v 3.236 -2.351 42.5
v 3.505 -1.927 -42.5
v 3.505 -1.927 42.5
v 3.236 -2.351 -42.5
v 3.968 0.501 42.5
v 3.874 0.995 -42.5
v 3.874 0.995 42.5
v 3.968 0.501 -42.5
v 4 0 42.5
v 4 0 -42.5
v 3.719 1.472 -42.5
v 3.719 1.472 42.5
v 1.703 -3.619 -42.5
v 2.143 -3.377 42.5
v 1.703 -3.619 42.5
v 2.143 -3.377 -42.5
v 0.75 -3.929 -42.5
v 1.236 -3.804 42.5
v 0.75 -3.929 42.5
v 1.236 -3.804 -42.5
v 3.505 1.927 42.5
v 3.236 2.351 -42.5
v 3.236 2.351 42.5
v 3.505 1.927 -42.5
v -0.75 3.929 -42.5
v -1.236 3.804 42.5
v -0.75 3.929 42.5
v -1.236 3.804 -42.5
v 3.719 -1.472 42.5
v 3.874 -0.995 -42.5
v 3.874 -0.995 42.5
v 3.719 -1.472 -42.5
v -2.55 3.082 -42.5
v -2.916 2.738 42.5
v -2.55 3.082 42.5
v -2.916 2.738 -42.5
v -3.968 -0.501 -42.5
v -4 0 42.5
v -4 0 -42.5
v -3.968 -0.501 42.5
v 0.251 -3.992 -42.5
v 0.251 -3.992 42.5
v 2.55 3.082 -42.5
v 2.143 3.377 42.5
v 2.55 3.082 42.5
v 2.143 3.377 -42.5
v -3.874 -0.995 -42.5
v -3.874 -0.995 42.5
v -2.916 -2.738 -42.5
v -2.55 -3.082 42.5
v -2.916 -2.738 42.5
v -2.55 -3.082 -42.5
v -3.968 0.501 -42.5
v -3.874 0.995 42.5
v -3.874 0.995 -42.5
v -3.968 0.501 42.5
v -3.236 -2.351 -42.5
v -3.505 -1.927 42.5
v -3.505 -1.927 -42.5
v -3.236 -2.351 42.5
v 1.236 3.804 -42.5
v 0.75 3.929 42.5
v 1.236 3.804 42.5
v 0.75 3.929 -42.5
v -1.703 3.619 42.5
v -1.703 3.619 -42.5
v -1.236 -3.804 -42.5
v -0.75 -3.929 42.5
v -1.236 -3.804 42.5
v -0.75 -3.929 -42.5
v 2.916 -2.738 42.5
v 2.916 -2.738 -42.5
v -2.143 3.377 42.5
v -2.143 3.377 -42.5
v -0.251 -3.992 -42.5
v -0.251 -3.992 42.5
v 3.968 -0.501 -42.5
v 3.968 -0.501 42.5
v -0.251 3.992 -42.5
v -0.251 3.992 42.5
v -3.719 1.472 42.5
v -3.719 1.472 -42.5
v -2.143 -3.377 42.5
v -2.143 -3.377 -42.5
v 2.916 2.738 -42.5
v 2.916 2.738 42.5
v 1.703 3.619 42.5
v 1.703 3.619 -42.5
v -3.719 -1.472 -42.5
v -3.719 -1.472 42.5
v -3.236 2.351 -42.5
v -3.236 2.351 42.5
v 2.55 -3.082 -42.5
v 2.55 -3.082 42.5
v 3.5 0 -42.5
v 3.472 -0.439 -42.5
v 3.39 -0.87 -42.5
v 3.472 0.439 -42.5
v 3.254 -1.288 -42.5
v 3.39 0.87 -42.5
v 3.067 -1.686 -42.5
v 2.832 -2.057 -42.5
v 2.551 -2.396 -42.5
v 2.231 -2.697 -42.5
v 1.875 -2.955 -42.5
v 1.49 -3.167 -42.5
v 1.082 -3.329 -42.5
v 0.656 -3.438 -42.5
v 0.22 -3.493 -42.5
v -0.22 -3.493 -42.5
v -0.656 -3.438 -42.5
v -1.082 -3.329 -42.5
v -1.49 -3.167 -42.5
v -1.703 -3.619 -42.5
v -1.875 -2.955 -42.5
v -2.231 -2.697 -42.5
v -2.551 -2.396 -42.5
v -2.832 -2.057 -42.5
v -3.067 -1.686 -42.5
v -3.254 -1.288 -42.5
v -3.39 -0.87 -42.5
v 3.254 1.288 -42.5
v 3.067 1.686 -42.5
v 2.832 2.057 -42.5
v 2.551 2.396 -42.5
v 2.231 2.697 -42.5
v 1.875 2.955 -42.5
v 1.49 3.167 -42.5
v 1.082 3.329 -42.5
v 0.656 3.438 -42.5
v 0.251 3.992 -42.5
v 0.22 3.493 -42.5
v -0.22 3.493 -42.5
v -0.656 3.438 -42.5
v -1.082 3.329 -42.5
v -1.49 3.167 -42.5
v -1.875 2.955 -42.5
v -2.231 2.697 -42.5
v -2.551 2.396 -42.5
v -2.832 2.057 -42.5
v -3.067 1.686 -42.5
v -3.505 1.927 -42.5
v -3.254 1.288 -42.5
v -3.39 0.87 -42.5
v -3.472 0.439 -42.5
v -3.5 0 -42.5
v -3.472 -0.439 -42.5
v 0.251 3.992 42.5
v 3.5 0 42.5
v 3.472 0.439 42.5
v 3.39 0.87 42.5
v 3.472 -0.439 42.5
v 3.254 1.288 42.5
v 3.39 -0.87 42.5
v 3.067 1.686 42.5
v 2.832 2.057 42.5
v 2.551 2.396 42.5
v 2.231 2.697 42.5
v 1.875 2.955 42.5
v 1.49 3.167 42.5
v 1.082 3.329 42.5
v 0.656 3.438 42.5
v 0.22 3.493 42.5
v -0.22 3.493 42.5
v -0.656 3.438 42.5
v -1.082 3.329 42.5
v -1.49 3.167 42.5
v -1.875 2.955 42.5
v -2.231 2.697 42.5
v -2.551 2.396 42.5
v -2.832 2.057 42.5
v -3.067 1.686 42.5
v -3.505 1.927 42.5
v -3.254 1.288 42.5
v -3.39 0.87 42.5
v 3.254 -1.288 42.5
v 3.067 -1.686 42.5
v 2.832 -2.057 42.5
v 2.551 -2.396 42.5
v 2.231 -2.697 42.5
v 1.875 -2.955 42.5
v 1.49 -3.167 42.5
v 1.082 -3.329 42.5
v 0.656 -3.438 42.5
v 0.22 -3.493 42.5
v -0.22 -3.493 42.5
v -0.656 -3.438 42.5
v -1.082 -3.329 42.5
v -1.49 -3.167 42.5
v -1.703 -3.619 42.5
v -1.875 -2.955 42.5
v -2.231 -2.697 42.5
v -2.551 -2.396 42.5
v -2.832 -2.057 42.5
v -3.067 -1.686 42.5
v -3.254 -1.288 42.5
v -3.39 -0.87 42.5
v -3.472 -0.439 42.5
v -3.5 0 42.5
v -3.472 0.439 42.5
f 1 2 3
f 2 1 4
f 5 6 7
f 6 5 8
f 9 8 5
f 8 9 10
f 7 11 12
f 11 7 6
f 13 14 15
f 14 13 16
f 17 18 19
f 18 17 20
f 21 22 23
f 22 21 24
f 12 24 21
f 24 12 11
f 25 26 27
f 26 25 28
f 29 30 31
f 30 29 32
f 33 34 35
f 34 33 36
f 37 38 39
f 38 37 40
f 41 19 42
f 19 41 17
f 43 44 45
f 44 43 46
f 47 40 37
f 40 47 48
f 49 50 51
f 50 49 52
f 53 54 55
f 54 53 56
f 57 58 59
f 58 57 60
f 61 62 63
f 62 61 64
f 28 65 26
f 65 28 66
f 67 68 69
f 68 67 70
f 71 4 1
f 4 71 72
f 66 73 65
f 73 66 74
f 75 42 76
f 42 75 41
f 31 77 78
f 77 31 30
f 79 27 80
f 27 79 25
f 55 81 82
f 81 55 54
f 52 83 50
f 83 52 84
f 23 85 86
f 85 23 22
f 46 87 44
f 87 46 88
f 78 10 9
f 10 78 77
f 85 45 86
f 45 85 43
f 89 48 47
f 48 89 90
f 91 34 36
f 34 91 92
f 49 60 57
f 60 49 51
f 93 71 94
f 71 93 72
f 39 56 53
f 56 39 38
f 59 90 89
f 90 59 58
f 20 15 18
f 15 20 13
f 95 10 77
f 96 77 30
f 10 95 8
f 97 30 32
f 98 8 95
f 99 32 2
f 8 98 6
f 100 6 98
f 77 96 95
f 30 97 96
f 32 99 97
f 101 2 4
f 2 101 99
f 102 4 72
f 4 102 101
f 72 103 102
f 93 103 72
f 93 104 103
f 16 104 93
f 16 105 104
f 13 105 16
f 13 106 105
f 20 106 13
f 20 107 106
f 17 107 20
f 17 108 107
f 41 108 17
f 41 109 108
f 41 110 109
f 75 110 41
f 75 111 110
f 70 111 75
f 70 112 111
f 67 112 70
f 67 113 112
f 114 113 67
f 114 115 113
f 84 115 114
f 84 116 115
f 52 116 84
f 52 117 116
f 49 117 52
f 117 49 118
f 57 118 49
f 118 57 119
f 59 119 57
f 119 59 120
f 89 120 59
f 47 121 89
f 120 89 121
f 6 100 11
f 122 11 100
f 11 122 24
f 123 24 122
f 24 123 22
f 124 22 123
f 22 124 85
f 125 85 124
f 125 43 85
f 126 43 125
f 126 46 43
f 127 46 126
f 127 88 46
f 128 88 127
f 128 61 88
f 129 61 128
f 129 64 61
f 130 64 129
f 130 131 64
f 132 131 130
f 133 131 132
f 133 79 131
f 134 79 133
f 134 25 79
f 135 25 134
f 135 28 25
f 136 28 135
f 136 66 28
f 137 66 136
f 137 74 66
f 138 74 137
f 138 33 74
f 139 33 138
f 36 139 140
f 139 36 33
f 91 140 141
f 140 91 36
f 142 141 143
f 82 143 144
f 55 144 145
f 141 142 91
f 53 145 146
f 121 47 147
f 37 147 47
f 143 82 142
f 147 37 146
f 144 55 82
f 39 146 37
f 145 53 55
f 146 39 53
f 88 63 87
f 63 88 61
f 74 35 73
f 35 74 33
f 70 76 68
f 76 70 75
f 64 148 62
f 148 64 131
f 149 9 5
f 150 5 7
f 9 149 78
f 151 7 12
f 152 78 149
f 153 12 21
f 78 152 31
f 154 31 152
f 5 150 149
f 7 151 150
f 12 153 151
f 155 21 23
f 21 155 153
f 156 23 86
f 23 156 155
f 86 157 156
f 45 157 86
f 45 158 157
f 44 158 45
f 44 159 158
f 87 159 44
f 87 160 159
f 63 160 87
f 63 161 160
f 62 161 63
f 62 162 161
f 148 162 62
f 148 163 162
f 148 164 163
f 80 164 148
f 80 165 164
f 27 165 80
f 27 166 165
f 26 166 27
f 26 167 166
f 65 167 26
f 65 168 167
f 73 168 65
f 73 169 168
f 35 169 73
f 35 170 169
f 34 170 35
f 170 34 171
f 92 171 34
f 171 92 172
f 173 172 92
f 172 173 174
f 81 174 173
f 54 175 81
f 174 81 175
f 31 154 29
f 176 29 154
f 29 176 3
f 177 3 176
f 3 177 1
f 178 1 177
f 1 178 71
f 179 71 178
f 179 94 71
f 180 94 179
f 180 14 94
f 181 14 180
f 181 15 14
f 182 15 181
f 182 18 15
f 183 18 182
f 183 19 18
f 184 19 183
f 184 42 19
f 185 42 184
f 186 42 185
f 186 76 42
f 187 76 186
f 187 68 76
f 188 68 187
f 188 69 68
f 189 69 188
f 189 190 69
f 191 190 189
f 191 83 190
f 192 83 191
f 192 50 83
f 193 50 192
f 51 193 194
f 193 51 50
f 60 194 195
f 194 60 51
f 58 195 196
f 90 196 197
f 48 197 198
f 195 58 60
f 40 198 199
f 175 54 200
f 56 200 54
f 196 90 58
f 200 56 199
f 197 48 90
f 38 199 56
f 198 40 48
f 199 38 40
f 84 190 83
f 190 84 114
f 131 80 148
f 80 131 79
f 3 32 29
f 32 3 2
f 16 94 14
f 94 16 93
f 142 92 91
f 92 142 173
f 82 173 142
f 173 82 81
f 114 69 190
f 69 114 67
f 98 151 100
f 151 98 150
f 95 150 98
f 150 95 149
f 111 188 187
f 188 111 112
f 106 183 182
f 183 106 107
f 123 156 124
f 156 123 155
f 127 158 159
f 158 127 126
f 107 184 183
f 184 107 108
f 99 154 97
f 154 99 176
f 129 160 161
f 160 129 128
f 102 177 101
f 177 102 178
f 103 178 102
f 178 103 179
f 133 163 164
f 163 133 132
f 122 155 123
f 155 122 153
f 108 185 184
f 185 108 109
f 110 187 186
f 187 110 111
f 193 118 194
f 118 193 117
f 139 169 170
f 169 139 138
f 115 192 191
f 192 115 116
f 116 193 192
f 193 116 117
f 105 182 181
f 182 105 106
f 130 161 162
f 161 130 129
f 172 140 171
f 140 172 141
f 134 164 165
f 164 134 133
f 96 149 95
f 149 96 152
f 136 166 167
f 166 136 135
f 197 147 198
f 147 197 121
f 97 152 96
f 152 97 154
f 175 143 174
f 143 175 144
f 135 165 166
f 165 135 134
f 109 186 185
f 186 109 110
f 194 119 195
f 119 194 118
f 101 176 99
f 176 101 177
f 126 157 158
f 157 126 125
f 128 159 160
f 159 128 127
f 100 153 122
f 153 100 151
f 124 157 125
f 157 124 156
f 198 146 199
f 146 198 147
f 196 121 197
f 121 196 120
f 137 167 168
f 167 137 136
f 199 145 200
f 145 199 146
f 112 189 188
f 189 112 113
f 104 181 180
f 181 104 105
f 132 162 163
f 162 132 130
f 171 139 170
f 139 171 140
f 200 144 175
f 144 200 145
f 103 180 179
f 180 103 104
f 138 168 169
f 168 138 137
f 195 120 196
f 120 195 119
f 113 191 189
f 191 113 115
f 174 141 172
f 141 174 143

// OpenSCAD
$fn = 50;


difference() {
	union() {
		translate(v = [0, 0, -42.5000000000]) {
			cylinder(h = 85, r = 4.0000000000);
		}
	}
	union() {
		translate(v = [0, 0, -100.0000000000]) {
			cylinder(h = 200, r = 3.5000000000);
		}
	}
}
